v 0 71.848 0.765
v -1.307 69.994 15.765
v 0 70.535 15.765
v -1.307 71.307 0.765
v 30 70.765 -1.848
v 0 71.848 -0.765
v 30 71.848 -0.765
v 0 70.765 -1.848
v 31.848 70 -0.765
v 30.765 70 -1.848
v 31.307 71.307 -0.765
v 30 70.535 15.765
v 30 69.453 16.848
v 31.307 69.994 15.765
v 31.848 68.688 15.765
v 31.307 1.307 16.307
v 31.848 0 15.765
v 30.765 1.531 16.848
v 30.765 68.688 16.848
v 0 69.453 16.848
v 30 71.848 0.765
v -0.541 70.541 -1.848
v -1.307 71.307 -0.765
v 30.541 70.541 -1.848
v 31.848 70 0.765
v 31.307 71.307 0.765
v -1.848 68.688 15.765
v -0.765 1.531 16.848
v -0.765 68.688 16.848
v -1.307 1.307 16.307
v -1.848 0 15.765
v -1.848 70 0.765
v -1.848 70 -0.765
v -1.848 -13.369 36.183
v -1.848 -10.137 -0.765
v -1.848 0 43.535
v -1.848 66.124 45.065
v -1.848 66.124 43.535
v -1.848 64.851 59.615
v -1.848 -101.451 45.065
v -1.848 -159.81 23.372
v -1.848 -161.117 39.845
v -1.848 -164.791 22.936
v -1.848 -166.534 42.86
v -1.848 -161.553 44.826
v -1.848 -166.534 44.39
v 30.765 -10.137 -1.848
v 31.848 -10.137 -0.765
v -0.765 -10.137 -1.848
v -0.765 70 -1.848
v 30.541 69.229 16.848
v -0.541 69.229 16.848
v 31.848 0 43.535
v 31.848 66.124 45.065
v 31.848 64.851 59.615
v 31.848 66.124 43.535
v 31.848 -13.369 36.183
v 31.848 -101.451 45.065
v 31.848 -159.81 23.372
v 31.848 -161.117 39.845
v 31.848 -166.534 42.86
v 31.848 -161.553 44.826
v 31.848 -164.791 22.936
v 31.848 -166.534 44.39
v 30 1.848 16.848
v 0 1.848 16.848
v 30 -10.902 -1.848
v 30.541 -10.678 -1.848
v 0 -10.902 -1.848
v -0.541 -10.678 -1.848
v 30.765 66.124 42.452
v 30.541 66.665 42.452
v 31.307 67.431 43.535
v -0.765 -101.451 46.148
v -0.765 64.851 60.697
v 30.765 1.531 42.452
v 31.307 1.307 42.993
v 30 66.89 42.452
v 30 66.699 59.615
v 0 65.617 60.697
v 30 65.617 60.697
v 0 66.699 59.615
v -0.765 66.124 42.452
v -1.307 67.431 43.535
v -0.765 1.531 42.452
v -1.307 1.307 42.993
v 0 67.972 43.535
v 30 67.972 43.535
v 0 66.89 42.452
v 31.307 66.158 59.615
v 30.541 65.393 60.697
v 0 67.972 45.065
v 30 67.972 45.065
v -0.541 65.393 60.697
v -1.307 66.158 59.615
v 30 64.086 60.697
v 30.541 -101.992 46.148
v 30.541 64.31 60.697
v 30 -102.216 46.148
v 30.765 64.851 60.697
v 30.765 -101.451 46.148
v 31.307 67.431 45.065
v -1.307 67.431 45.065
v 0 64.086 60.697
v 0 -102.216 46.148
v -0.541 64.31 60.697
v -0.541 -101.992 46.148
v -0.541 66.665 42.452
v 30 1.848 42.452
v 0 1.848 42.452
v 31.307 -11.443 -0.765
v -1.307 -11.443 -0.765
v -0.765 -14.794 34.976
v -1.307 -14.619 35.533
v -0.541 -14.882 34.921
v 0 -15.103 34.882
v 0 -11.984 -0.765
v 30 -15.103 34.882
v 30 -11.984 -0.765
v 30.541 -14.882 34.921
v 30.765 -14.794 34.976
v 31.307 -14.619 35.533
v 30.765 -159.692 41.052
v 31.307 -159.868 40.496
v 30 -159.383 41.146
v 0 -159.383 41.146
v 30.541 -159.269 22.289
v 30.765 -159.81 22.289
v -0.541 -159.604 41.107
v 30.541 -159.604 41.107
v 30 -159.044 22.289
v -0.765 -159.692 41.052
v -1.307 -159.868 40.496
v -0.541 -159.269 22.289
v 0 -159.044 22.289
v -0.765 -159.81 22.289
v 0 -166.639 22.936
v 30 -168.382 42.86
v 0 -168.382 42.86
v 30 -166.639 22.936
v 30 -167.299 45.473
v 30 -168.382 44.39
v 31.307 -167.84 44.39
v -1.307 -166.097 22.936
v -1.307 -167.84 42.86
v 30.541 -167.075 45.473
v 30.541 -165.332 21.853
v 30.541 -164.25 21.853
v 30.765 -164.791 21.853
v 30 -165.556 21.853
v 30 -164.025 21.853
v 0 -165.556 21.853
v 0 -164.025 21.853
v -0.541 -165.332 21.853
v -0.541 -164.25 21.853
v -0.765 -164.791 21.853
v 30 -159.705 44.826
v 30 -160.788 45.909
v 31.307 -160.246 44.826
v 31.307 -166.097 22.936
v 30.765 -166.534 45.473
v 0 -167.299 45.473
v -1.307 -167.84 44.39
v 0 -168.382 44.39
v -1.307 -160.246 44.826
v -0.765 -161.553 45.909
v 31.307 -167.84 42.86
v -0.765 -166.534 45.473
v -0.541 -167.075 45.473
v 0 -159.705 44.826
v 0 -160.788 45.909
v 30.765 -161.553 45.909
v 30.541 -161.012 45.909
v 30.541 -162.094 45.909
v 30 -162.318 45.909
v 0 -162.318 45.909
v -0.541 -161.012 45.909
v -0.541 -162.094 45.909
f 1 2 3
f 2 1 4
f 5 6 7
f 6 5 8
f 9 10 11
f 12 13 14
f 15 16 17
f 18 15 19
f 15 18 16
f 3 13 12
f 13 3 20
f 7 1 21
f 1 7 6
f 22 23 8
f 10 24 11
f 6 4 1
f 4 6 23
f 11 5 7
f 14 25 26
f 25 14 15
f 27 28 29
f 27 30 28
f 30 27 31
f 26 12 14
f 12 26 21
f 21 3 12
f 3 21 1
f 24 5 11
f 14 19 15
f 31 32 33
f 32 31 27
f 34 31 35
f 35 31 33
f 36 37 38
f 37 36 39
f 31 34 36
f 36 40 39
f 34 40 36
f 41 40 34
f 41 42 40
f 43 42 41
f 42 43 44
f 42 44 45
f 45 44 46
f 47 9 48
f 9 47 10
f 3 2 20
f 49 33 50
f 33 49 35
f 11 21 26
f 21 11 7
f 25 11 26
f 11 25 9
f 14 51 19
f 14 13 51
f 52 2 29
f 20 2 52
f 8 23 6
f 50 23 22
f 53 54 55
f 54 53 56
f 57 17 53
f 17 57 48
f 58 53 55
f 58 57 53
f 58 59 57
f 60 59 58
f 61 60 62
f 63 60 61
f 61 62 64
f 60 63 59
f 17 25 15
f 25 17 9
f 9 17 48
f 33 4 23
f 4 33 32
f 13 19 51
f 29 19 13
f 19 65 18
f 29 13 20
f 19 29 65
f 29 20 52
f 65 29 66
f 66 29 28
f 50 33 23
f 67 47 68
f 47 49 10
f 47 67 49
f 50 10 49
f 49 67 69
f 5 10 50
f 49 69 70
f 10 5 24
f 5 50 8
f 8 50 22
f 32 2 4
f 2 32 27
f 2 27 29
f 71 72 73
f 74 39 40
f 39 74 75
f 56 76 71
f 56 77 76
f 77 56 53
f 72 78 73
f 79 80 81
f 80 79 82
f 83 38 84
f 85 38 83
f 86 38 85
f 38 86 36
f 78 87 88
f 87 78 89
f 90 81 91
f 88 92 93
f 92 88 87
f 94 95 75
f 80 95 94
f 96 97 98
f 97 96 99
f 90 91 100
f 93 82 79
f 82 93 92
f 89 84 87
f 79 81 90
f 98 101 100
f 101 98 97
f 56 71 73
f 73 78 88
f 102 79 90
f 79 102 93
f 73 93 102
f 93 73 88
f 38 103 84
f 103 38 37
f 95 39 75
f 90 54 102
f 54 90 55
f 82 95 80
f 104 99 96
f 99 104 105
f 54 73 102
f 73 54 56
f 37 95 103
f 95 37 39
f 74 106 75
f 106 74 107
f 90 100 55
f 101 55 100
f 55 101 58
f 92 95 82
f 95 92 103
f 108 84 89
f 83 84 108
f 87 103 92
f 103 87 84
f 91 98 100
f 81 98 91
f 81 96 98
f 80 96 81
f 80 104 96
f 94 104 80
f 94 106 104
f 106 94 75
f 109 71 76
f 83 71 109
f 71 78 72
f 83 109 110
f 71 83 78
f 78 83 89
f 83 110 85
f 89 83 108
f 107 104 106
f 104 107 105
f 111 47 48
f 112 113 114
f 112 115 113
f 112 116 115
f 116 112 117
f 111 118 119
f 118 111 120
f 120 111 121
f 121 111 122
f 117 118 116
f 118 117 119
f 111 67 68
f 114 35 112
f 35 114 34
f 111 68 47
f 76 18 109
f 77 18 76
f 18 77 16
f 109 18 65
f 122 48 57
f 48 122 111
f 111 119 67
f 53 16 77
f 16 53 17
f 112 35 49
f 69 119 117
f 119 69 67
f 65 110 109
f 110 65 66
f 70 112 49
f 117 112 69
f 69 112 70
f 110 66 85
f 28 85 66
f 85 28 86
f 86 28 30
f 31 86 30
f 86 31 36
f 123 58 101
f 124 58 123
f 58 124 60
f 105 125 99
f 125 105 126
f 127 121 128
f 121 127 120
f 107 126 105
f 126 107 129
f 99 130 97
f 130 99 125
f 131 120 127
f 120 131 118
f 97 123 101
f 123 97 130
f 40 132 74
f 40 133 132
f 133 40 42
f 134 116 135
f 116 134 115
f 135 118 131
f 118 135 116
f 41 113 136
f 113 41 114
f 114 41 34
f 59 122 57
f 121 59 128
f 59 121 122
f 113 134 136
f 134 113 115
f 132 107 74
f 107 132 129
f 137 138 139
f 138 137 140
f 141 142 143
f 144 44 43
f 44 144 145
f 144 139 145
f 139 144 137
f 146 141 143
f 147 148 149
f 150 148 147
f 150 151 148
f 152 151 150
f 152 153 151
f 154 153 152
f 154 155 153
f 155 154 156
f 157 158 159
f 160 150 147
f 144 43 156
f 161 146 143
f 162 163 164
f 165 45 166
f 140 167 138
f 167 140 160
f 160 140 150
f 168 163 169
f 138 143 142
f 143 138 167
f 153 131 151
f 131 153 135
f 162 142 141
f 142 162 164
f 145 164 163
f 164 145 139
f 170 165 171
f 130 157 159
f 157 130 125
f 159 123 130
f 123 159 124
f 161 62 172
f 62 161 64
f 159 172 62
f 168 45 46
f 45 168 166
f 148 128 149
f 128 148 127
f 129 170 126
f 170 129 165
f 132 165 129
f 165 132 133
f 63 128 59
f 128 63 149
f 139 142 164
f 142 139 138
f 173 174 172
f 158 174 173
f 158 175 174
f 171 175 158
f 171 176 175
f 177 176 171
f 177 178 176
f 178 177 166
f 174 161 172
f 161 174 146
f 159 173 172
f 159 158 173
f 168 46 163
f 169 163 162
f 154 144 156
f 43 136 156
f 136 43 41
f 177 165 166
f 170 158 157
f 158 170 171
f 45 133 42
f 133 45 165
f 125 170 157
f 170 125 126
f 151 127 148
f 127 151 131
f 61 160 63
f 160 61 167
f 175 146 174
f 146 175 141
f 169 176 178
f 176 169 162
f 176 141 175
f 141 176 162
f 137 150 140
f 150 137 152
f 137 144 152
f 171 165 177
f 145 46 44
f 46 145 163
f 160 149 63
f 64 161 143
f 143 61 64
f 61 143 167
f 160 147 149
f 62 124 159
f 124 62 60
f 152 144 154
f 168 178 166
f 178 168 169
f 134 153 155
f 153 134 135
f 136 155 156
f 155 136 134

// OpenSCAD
arm_length = 70;
arm_width = 30;
arm_thickness = 15;

fillet_r = 2;

desk_thickness = 25 + 0.3 + fillet_r*2;

keyboard_angle = 5;
keyboard_length = 152+80;

lip_size = 5;

minkowski(){
    sphere(fillet_r, $fn=8);
    difference(){
        translate([0,arm_length-keyboard_length-lip_size,0])
        cube([arm_width, keyboard_length+lip_size, arm_thickness*2 + desk_thickness]);
        translate([0,0,arm_thickness])
        cube([arm_width, arm_length, desk_thickness]);
        
        #
        translate([0,arm_length,0])
        rotate([keyboard_angle,0,0])
        translate([0,0,0])
        cube([arm_width, arm_width, arm_thickness*2 + desk_thickness]);
        
        
        #translate([0,arm_length,arm_thickness*2 + desk_thickness])
        rotate([keyboard_angle,0,0])
        translate([0,-keyboard_length,0])
        keyboard_form();
    }
}

module keyboard_form() {
    cube([arm_width, keyboard_length, desk_thickness]);
    
    translate([0,-arm_thickness-arm_length,-desk_thickness-arm_thickness*2])
    cube([arm_width, keyboard_length, desk_thickness+arm_thickness]);
    
    translate([0,-arm_thickness-lip_size,-desk_thickness-arm_thickness*2])
    cube([arm_width, arm_thickness, desk_thickness+arm_thickness*2+lip_size]);
    
    translate([0,-arm_thickness,lip_size])
    cube([arm_width, arm_thickness,arm_thickness*2]);
    
    
    
}
